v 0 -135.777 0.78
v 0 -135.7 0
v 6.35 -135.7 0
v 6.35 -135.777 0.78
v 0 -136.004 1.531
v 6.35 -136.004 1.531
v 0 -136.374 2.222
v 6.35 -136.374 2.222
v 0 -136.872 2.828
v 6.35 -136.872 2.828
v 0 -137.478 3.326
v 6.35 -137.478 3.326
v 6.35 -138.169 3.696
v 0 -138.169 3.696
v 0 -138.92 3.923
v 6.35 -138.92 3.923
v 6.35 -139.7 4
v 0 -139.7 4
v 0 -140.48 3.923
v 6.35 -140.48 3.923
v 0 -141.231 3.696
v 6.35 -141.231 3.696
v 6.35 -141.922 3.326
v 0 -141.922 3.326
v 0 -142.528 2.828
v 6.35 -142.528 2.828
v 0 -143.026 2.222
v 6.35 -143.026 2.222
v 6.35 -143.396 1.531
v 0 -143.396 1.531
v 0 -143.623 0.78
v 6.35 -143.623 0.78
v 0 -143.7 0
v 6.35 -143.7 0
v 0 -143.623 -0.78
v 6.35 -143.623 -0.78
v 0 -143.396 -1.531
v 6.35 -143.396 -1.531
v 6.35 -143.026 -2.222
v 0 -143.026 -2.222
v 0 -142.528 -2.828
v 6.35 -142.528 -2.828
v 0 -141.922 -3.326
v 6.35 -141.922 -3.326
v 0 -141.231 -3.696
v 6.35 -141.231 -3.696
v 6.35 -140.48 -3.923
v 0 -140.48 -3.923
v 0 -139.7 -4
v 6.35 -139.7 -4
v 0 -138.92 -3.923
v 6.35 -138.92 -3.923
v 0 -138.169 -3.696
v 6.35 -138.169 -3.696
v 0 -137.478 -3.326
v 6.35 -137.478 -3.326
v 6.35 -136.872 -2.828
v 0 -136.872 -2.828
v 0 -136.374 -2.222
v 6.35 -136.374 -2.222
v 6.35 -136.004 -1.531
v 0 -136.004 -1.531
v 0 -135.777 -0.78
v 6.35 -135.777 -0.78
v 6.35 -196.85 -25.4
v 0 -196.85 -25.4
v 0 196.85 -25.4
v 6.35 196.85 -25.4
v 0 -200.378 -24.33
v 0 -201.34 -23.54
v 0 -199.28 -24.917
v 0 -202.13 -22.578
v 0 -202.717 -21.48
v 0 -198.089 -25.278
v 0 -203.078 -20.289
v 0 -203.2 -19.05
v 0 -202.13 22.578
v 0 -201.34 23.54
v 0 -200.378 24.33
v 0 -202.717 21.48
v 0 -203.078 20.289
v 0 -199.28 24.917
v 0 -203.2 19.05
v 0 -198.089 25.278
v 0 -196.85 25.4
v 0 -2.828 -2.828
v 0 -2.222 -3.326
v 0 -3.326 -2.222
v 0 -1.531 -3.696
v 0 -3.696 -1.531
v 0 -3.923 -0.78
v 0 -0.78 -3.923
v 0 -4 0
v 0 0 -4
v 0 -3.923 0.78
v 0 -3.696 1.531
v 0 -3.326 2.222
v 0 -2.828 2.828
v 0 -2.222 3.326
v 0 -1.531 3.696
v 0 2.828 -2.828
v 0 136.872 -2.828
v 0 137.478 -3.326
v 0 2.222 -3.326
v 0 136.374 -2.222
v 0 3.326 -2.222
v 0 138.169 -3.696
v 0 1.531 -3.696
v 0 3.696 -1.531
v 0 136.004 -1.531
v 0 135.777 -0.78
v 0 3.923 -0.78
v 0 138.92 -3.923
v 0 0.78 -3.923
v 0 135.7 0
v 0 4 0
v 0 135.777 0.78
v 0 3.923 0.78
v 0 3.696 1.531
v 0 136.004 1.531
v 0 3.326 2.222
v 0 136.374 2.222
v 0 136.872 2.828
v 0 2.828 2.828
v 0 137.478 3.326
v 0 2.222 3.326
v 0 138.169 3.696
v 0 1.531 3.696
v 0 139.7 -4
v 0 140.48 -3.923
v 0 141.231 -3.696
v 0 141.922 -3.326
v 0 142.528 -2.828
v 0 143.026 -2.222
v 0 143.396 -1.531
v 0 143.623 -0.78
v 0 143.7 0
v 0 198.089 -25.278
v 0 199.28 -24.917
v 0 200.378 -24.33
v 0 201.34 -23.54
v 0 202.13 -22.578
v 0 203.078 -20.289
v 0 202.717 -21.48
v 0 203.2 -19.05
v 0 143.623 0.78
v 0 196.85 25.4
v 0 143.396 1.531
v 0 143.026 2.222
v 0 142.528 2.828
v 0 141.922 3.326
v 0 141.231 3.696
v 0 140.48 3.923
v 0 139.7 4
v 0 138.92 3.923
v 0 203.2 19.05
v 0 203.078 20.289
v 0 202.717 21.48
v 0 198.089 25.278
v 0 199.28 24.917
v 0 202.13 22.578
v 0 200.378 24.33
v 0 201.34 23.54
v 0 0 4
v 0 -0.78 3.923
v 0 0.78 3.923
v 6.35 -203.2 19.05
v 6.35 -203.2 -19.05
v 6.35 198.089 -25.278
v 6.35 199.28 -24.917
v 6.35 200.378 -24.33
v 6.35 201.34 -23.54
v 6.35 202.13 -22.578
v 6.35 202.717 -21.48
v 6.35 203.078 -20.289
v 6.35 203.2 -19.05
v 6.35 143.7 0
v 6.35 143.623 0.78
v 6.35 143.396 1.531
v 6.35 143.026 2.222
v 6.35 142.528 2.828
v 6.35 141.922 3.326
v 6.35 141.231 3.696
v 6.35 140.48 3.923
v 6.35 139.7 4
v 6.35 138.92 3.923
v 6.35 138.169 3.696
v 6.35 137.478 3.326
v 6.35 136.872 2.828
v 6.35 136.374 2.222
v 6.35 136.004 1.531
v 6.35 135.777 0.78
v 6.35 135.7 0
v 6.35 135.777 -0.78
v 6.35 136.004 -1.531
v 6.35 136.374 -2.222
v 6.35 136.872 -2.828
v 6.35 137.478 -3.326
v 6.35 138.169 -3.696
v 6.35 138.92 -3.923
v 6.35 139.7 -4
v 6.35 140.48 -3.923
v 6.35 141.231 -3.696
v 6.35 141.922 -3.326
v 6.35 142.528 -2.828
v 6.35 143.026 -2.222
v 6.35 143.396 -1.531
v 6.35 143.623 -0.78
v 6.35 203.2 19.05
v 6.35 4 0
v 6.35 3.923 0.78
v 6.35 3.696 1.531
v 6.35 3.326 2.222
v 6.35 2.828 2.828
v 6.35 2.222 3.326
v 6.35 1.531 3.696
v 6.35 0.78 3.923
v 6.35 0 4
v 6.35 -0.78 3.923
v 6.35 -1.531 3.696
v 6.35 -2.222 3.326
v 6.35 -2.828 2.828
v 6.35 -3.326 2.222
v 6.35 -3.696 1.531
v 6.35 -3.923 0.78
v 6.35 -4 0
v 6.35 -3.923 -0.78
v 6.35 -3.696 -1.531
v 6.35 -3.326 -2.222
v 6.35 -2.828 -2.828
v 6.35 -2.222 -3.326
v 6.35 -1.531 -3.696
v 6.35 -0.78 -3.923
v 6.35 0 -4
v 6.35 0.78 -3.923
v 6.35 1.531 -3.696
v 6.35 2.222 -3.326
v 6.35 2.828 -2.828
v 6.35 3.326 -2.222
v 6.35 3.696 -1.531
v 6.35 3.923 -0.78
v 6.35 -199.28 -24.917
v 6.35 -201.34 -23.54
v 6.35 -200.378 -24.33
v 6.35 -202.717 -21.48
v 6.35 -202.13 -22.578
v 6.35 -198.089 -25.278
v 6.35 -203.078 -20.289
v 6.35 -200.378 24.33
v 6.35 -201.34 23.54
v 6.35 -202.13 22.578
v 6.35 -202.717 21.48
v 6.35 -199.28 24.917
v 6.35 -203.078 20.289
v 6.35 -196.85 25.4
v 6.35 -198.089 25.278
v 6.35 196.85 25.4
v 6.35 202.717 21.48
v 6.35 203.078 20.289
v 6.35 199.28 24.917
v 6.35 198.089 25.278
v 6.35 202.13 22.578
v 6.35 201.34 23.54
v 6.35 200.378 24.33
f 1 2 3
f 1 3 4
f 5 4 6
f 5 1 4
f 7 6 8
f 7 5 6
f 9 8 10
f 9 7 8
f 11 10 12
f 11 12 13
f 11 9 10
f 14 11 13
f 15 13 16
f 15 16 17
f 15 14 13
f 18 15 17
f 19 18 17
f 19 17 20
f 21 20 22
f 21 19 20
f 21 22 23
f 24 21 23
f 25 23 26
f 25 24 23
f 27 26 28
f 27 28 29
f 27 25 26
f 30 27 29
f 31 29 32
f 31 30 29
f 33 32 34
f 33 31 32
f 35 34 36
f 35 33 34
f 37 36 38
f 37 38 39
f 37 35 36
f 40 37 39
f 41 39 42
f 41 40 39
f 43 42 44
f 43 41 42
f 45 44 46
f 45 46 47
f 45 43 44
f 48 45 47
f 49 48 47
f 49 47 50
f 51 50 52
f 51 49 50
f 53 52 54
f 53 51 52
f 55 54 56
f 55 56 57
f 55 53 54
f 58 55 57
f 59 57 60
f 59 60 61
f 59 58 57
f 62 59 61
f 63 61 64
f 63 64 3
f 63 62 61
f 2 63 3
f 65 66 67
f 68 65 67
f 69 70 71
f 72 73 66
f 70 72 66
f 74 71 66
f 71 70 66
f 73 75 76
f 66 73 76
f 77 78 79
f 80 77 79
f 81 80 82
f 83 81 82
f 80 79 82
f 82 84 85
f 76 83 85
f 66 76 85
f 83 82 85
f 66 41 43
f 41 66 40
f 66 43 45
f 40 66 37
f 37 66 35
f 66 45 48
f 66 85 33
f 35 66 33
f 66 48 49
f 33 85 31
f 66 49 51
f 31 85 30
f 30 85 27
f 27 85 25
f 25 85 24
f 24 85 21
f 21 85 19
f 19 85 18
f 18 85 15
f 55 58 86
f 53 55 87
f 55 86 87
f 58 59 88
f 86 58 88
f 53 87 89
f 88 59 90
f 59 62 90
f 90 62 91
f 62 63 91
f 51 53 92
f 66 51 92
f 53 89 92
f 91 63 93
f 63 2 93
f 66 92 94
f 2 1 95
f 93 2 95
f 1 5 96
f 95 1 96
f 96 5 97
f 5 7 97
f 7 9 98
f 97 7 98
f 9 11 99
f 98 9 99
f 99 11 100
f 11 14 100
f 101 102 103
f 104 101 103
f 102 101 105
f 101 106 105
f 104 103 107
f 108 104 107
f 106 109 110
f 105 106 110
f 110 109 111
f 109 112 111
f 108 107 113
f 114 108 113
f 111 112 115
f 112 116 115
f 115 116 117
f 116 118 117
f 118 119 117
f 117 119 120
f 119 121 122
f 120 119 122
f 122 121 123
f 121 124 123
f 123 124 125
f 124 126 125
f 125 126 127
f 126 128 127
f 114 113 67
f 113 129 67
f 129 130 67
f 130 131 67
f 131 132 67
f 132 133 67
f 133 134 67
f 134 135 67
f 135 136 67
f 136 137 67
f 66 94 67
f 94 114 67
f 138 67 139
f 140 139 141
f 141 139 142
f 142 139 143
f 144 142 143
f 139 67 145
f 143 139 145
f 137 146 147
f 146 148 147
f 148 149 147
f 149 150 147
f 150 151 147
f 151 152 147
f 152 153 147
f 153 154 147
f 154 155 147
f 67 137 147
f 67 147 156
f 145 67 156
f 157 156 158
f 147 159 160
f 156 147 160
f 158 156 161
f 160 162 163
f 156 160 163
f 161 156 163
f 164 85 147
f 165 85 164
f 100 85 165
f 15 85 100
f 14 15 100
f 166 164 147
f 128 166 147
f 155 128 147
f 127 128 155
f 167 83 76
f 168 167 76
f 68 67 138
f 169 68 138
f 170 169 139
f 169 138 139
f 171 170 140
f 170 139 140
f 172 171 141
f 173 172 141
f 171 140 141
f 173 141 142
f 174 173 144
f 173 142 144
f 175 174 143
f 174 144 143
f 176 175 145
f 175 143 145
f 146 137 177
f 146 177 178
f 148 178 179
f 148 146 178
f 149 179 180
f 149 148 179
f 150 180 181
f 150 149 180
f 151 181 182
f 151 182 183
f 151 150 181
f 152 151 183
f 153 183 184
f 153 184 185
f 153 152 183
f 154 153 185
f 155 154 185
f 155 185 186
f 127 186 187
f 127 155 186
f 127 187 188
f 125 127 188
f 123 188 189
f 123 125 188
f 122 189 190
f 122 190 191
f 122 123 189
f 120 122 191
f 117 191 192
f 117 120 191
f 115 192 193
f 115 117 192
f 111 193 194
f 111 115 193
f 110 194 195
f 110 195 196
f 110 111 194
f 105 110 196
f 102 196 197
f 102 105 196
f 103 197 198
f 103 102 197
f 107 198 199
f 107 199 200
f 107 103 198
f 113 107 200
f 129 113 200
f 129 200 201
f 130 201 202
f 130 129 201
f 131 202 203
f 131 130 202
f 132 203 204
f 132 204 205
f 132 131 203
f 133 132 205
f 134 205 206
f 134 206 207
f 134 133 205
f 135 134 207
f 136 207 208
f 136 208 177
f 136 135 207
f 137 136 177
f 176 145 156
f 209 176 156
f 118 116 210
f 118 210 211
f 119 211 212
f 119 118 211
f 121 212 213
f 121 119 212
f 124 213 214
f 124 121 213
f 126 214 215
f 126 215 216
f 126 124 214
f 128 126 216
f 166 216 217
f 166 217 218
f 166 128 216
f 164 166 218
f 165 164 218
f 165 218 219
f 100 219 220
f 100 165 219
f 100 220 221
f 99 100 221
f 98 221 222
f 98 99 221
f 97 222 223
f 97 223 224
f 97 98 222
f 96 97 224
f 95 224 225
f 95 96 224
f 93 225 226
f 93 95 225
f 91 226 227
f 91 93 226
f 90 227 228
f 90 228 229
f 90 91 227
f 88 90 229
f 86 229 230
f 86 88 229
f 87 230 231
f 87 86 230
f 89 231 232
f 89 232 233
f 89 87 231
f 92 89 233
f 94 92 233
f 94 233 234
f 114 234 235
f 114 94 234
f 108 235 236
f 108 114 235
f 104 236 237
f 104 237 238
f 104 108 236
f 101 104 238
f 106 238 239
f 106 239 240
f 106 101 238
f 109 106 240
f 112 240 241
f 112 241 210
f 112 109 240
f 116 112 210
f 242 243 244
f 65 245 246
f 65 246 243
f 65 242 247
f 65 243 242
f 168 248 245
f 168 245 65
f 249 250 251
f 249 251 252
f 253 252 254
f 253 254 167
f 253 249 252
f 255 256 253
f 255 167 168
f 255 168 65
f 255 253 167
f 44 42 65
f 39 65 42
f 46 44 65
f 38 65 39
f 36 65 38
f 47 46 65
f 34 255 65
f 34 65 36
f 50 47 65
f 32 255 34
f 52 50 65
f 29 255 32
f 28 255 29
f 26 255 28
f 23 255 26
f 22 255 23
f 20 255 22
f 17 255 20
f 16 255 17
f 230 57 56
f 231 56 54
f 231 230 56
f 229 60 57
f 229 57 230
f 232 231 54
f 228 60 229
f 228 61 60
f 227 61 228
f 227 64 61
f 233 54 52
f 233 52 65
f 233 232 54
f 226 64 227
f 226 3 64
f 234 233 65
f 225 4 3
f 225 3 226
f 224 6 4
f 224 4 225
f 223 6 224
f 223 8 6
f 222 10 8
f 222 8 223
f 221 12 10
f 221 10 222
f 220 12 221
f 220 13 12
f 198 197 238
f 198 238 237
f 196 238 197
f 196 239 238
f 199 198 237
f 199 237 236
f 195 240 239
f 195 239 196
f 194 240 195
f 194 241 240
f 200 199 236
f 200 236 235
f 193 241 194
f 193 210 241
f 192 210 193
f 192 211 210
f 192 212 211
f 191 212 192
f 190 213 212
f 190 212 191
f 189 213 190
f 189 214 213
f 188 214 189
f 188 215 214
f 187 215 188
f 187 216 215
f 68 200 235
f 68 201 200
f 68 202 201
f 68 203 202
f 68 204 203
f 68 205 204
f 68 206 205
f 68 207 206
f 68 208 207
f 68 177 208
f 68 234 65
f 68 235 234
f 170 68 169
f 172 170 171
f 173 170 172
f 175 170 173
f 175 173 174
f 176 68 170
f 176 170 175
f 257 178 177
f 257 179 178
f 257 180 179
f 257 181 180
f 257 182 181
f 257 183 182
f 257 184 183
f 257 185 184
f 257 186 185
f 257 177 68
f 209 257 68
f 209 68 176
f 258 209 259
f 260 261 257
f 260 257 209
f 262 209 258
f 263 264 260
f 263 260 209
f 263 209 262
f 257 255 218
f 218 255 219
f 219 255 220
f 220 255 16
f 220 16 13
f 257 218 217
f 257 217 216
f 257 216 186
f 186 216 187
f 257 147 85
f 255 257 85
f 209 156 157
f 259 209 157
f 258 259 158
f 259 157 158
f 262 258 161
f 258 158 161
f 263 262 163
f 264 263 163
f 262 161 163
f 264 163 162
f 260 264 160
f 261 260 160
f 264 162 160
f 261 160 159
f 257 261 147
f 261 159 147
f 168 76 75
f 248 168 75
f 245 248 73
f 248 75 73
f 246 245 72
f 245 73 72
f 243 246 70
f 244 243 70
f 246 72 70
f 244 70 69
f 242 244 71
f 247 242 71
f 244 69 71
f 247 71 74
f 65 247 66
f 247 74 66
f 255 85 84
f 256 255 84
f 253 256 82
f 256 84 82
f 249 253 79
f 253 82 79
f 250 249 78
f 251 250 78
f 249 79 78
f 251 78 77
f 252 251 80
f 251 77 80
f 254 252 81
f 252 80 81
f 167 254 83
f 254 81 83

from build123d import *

# Parameters (mm, degrees)
F0_R     = 4
F1_DEPTH = 6.35


with BuildPart() as f1:
    # F0 (on Right) → F1 (new body)
    with BuildSketch(Plane.YZ):
        with BuildLine():
            ThreePointArc((203.2, 19.05), (201.340128, 23.540128), (196.85, 25.4))
            Line((196.85, 25.4), (-196.85, 25.4))
            ThreePointArc((-196.85, 25.4), (-201.340128, 23.540128), (-203.2, 19.05))
            Line((-203.2, 19.05), (-203.2, -19.05))
            ThreePointArc((-203.2, -19.05), (-201.340128, -23.540128), (-196.85, -25.4))
            Line((-196.85, -25.4), (196.85, -25.4))
            ThreePointArc((196.85, -25.4), (201.340128, -23.540128), (203.2, -19.05))
            Line((203.2, -19.05), (203.2, 19.05))
        make_face()
        with Locations((-139.7, 0)):
            Circle(F0_R, mode=Mode.SUBTRACT)
        Circle(F0_R, mode=Mode.SUBTRACT)
        with Locations((139.7, 0)):
            Circle(F0_R, mode=Mode.SUBTRACT)
    extrude(amount=F1_DEPTH)


solid = f1.part
